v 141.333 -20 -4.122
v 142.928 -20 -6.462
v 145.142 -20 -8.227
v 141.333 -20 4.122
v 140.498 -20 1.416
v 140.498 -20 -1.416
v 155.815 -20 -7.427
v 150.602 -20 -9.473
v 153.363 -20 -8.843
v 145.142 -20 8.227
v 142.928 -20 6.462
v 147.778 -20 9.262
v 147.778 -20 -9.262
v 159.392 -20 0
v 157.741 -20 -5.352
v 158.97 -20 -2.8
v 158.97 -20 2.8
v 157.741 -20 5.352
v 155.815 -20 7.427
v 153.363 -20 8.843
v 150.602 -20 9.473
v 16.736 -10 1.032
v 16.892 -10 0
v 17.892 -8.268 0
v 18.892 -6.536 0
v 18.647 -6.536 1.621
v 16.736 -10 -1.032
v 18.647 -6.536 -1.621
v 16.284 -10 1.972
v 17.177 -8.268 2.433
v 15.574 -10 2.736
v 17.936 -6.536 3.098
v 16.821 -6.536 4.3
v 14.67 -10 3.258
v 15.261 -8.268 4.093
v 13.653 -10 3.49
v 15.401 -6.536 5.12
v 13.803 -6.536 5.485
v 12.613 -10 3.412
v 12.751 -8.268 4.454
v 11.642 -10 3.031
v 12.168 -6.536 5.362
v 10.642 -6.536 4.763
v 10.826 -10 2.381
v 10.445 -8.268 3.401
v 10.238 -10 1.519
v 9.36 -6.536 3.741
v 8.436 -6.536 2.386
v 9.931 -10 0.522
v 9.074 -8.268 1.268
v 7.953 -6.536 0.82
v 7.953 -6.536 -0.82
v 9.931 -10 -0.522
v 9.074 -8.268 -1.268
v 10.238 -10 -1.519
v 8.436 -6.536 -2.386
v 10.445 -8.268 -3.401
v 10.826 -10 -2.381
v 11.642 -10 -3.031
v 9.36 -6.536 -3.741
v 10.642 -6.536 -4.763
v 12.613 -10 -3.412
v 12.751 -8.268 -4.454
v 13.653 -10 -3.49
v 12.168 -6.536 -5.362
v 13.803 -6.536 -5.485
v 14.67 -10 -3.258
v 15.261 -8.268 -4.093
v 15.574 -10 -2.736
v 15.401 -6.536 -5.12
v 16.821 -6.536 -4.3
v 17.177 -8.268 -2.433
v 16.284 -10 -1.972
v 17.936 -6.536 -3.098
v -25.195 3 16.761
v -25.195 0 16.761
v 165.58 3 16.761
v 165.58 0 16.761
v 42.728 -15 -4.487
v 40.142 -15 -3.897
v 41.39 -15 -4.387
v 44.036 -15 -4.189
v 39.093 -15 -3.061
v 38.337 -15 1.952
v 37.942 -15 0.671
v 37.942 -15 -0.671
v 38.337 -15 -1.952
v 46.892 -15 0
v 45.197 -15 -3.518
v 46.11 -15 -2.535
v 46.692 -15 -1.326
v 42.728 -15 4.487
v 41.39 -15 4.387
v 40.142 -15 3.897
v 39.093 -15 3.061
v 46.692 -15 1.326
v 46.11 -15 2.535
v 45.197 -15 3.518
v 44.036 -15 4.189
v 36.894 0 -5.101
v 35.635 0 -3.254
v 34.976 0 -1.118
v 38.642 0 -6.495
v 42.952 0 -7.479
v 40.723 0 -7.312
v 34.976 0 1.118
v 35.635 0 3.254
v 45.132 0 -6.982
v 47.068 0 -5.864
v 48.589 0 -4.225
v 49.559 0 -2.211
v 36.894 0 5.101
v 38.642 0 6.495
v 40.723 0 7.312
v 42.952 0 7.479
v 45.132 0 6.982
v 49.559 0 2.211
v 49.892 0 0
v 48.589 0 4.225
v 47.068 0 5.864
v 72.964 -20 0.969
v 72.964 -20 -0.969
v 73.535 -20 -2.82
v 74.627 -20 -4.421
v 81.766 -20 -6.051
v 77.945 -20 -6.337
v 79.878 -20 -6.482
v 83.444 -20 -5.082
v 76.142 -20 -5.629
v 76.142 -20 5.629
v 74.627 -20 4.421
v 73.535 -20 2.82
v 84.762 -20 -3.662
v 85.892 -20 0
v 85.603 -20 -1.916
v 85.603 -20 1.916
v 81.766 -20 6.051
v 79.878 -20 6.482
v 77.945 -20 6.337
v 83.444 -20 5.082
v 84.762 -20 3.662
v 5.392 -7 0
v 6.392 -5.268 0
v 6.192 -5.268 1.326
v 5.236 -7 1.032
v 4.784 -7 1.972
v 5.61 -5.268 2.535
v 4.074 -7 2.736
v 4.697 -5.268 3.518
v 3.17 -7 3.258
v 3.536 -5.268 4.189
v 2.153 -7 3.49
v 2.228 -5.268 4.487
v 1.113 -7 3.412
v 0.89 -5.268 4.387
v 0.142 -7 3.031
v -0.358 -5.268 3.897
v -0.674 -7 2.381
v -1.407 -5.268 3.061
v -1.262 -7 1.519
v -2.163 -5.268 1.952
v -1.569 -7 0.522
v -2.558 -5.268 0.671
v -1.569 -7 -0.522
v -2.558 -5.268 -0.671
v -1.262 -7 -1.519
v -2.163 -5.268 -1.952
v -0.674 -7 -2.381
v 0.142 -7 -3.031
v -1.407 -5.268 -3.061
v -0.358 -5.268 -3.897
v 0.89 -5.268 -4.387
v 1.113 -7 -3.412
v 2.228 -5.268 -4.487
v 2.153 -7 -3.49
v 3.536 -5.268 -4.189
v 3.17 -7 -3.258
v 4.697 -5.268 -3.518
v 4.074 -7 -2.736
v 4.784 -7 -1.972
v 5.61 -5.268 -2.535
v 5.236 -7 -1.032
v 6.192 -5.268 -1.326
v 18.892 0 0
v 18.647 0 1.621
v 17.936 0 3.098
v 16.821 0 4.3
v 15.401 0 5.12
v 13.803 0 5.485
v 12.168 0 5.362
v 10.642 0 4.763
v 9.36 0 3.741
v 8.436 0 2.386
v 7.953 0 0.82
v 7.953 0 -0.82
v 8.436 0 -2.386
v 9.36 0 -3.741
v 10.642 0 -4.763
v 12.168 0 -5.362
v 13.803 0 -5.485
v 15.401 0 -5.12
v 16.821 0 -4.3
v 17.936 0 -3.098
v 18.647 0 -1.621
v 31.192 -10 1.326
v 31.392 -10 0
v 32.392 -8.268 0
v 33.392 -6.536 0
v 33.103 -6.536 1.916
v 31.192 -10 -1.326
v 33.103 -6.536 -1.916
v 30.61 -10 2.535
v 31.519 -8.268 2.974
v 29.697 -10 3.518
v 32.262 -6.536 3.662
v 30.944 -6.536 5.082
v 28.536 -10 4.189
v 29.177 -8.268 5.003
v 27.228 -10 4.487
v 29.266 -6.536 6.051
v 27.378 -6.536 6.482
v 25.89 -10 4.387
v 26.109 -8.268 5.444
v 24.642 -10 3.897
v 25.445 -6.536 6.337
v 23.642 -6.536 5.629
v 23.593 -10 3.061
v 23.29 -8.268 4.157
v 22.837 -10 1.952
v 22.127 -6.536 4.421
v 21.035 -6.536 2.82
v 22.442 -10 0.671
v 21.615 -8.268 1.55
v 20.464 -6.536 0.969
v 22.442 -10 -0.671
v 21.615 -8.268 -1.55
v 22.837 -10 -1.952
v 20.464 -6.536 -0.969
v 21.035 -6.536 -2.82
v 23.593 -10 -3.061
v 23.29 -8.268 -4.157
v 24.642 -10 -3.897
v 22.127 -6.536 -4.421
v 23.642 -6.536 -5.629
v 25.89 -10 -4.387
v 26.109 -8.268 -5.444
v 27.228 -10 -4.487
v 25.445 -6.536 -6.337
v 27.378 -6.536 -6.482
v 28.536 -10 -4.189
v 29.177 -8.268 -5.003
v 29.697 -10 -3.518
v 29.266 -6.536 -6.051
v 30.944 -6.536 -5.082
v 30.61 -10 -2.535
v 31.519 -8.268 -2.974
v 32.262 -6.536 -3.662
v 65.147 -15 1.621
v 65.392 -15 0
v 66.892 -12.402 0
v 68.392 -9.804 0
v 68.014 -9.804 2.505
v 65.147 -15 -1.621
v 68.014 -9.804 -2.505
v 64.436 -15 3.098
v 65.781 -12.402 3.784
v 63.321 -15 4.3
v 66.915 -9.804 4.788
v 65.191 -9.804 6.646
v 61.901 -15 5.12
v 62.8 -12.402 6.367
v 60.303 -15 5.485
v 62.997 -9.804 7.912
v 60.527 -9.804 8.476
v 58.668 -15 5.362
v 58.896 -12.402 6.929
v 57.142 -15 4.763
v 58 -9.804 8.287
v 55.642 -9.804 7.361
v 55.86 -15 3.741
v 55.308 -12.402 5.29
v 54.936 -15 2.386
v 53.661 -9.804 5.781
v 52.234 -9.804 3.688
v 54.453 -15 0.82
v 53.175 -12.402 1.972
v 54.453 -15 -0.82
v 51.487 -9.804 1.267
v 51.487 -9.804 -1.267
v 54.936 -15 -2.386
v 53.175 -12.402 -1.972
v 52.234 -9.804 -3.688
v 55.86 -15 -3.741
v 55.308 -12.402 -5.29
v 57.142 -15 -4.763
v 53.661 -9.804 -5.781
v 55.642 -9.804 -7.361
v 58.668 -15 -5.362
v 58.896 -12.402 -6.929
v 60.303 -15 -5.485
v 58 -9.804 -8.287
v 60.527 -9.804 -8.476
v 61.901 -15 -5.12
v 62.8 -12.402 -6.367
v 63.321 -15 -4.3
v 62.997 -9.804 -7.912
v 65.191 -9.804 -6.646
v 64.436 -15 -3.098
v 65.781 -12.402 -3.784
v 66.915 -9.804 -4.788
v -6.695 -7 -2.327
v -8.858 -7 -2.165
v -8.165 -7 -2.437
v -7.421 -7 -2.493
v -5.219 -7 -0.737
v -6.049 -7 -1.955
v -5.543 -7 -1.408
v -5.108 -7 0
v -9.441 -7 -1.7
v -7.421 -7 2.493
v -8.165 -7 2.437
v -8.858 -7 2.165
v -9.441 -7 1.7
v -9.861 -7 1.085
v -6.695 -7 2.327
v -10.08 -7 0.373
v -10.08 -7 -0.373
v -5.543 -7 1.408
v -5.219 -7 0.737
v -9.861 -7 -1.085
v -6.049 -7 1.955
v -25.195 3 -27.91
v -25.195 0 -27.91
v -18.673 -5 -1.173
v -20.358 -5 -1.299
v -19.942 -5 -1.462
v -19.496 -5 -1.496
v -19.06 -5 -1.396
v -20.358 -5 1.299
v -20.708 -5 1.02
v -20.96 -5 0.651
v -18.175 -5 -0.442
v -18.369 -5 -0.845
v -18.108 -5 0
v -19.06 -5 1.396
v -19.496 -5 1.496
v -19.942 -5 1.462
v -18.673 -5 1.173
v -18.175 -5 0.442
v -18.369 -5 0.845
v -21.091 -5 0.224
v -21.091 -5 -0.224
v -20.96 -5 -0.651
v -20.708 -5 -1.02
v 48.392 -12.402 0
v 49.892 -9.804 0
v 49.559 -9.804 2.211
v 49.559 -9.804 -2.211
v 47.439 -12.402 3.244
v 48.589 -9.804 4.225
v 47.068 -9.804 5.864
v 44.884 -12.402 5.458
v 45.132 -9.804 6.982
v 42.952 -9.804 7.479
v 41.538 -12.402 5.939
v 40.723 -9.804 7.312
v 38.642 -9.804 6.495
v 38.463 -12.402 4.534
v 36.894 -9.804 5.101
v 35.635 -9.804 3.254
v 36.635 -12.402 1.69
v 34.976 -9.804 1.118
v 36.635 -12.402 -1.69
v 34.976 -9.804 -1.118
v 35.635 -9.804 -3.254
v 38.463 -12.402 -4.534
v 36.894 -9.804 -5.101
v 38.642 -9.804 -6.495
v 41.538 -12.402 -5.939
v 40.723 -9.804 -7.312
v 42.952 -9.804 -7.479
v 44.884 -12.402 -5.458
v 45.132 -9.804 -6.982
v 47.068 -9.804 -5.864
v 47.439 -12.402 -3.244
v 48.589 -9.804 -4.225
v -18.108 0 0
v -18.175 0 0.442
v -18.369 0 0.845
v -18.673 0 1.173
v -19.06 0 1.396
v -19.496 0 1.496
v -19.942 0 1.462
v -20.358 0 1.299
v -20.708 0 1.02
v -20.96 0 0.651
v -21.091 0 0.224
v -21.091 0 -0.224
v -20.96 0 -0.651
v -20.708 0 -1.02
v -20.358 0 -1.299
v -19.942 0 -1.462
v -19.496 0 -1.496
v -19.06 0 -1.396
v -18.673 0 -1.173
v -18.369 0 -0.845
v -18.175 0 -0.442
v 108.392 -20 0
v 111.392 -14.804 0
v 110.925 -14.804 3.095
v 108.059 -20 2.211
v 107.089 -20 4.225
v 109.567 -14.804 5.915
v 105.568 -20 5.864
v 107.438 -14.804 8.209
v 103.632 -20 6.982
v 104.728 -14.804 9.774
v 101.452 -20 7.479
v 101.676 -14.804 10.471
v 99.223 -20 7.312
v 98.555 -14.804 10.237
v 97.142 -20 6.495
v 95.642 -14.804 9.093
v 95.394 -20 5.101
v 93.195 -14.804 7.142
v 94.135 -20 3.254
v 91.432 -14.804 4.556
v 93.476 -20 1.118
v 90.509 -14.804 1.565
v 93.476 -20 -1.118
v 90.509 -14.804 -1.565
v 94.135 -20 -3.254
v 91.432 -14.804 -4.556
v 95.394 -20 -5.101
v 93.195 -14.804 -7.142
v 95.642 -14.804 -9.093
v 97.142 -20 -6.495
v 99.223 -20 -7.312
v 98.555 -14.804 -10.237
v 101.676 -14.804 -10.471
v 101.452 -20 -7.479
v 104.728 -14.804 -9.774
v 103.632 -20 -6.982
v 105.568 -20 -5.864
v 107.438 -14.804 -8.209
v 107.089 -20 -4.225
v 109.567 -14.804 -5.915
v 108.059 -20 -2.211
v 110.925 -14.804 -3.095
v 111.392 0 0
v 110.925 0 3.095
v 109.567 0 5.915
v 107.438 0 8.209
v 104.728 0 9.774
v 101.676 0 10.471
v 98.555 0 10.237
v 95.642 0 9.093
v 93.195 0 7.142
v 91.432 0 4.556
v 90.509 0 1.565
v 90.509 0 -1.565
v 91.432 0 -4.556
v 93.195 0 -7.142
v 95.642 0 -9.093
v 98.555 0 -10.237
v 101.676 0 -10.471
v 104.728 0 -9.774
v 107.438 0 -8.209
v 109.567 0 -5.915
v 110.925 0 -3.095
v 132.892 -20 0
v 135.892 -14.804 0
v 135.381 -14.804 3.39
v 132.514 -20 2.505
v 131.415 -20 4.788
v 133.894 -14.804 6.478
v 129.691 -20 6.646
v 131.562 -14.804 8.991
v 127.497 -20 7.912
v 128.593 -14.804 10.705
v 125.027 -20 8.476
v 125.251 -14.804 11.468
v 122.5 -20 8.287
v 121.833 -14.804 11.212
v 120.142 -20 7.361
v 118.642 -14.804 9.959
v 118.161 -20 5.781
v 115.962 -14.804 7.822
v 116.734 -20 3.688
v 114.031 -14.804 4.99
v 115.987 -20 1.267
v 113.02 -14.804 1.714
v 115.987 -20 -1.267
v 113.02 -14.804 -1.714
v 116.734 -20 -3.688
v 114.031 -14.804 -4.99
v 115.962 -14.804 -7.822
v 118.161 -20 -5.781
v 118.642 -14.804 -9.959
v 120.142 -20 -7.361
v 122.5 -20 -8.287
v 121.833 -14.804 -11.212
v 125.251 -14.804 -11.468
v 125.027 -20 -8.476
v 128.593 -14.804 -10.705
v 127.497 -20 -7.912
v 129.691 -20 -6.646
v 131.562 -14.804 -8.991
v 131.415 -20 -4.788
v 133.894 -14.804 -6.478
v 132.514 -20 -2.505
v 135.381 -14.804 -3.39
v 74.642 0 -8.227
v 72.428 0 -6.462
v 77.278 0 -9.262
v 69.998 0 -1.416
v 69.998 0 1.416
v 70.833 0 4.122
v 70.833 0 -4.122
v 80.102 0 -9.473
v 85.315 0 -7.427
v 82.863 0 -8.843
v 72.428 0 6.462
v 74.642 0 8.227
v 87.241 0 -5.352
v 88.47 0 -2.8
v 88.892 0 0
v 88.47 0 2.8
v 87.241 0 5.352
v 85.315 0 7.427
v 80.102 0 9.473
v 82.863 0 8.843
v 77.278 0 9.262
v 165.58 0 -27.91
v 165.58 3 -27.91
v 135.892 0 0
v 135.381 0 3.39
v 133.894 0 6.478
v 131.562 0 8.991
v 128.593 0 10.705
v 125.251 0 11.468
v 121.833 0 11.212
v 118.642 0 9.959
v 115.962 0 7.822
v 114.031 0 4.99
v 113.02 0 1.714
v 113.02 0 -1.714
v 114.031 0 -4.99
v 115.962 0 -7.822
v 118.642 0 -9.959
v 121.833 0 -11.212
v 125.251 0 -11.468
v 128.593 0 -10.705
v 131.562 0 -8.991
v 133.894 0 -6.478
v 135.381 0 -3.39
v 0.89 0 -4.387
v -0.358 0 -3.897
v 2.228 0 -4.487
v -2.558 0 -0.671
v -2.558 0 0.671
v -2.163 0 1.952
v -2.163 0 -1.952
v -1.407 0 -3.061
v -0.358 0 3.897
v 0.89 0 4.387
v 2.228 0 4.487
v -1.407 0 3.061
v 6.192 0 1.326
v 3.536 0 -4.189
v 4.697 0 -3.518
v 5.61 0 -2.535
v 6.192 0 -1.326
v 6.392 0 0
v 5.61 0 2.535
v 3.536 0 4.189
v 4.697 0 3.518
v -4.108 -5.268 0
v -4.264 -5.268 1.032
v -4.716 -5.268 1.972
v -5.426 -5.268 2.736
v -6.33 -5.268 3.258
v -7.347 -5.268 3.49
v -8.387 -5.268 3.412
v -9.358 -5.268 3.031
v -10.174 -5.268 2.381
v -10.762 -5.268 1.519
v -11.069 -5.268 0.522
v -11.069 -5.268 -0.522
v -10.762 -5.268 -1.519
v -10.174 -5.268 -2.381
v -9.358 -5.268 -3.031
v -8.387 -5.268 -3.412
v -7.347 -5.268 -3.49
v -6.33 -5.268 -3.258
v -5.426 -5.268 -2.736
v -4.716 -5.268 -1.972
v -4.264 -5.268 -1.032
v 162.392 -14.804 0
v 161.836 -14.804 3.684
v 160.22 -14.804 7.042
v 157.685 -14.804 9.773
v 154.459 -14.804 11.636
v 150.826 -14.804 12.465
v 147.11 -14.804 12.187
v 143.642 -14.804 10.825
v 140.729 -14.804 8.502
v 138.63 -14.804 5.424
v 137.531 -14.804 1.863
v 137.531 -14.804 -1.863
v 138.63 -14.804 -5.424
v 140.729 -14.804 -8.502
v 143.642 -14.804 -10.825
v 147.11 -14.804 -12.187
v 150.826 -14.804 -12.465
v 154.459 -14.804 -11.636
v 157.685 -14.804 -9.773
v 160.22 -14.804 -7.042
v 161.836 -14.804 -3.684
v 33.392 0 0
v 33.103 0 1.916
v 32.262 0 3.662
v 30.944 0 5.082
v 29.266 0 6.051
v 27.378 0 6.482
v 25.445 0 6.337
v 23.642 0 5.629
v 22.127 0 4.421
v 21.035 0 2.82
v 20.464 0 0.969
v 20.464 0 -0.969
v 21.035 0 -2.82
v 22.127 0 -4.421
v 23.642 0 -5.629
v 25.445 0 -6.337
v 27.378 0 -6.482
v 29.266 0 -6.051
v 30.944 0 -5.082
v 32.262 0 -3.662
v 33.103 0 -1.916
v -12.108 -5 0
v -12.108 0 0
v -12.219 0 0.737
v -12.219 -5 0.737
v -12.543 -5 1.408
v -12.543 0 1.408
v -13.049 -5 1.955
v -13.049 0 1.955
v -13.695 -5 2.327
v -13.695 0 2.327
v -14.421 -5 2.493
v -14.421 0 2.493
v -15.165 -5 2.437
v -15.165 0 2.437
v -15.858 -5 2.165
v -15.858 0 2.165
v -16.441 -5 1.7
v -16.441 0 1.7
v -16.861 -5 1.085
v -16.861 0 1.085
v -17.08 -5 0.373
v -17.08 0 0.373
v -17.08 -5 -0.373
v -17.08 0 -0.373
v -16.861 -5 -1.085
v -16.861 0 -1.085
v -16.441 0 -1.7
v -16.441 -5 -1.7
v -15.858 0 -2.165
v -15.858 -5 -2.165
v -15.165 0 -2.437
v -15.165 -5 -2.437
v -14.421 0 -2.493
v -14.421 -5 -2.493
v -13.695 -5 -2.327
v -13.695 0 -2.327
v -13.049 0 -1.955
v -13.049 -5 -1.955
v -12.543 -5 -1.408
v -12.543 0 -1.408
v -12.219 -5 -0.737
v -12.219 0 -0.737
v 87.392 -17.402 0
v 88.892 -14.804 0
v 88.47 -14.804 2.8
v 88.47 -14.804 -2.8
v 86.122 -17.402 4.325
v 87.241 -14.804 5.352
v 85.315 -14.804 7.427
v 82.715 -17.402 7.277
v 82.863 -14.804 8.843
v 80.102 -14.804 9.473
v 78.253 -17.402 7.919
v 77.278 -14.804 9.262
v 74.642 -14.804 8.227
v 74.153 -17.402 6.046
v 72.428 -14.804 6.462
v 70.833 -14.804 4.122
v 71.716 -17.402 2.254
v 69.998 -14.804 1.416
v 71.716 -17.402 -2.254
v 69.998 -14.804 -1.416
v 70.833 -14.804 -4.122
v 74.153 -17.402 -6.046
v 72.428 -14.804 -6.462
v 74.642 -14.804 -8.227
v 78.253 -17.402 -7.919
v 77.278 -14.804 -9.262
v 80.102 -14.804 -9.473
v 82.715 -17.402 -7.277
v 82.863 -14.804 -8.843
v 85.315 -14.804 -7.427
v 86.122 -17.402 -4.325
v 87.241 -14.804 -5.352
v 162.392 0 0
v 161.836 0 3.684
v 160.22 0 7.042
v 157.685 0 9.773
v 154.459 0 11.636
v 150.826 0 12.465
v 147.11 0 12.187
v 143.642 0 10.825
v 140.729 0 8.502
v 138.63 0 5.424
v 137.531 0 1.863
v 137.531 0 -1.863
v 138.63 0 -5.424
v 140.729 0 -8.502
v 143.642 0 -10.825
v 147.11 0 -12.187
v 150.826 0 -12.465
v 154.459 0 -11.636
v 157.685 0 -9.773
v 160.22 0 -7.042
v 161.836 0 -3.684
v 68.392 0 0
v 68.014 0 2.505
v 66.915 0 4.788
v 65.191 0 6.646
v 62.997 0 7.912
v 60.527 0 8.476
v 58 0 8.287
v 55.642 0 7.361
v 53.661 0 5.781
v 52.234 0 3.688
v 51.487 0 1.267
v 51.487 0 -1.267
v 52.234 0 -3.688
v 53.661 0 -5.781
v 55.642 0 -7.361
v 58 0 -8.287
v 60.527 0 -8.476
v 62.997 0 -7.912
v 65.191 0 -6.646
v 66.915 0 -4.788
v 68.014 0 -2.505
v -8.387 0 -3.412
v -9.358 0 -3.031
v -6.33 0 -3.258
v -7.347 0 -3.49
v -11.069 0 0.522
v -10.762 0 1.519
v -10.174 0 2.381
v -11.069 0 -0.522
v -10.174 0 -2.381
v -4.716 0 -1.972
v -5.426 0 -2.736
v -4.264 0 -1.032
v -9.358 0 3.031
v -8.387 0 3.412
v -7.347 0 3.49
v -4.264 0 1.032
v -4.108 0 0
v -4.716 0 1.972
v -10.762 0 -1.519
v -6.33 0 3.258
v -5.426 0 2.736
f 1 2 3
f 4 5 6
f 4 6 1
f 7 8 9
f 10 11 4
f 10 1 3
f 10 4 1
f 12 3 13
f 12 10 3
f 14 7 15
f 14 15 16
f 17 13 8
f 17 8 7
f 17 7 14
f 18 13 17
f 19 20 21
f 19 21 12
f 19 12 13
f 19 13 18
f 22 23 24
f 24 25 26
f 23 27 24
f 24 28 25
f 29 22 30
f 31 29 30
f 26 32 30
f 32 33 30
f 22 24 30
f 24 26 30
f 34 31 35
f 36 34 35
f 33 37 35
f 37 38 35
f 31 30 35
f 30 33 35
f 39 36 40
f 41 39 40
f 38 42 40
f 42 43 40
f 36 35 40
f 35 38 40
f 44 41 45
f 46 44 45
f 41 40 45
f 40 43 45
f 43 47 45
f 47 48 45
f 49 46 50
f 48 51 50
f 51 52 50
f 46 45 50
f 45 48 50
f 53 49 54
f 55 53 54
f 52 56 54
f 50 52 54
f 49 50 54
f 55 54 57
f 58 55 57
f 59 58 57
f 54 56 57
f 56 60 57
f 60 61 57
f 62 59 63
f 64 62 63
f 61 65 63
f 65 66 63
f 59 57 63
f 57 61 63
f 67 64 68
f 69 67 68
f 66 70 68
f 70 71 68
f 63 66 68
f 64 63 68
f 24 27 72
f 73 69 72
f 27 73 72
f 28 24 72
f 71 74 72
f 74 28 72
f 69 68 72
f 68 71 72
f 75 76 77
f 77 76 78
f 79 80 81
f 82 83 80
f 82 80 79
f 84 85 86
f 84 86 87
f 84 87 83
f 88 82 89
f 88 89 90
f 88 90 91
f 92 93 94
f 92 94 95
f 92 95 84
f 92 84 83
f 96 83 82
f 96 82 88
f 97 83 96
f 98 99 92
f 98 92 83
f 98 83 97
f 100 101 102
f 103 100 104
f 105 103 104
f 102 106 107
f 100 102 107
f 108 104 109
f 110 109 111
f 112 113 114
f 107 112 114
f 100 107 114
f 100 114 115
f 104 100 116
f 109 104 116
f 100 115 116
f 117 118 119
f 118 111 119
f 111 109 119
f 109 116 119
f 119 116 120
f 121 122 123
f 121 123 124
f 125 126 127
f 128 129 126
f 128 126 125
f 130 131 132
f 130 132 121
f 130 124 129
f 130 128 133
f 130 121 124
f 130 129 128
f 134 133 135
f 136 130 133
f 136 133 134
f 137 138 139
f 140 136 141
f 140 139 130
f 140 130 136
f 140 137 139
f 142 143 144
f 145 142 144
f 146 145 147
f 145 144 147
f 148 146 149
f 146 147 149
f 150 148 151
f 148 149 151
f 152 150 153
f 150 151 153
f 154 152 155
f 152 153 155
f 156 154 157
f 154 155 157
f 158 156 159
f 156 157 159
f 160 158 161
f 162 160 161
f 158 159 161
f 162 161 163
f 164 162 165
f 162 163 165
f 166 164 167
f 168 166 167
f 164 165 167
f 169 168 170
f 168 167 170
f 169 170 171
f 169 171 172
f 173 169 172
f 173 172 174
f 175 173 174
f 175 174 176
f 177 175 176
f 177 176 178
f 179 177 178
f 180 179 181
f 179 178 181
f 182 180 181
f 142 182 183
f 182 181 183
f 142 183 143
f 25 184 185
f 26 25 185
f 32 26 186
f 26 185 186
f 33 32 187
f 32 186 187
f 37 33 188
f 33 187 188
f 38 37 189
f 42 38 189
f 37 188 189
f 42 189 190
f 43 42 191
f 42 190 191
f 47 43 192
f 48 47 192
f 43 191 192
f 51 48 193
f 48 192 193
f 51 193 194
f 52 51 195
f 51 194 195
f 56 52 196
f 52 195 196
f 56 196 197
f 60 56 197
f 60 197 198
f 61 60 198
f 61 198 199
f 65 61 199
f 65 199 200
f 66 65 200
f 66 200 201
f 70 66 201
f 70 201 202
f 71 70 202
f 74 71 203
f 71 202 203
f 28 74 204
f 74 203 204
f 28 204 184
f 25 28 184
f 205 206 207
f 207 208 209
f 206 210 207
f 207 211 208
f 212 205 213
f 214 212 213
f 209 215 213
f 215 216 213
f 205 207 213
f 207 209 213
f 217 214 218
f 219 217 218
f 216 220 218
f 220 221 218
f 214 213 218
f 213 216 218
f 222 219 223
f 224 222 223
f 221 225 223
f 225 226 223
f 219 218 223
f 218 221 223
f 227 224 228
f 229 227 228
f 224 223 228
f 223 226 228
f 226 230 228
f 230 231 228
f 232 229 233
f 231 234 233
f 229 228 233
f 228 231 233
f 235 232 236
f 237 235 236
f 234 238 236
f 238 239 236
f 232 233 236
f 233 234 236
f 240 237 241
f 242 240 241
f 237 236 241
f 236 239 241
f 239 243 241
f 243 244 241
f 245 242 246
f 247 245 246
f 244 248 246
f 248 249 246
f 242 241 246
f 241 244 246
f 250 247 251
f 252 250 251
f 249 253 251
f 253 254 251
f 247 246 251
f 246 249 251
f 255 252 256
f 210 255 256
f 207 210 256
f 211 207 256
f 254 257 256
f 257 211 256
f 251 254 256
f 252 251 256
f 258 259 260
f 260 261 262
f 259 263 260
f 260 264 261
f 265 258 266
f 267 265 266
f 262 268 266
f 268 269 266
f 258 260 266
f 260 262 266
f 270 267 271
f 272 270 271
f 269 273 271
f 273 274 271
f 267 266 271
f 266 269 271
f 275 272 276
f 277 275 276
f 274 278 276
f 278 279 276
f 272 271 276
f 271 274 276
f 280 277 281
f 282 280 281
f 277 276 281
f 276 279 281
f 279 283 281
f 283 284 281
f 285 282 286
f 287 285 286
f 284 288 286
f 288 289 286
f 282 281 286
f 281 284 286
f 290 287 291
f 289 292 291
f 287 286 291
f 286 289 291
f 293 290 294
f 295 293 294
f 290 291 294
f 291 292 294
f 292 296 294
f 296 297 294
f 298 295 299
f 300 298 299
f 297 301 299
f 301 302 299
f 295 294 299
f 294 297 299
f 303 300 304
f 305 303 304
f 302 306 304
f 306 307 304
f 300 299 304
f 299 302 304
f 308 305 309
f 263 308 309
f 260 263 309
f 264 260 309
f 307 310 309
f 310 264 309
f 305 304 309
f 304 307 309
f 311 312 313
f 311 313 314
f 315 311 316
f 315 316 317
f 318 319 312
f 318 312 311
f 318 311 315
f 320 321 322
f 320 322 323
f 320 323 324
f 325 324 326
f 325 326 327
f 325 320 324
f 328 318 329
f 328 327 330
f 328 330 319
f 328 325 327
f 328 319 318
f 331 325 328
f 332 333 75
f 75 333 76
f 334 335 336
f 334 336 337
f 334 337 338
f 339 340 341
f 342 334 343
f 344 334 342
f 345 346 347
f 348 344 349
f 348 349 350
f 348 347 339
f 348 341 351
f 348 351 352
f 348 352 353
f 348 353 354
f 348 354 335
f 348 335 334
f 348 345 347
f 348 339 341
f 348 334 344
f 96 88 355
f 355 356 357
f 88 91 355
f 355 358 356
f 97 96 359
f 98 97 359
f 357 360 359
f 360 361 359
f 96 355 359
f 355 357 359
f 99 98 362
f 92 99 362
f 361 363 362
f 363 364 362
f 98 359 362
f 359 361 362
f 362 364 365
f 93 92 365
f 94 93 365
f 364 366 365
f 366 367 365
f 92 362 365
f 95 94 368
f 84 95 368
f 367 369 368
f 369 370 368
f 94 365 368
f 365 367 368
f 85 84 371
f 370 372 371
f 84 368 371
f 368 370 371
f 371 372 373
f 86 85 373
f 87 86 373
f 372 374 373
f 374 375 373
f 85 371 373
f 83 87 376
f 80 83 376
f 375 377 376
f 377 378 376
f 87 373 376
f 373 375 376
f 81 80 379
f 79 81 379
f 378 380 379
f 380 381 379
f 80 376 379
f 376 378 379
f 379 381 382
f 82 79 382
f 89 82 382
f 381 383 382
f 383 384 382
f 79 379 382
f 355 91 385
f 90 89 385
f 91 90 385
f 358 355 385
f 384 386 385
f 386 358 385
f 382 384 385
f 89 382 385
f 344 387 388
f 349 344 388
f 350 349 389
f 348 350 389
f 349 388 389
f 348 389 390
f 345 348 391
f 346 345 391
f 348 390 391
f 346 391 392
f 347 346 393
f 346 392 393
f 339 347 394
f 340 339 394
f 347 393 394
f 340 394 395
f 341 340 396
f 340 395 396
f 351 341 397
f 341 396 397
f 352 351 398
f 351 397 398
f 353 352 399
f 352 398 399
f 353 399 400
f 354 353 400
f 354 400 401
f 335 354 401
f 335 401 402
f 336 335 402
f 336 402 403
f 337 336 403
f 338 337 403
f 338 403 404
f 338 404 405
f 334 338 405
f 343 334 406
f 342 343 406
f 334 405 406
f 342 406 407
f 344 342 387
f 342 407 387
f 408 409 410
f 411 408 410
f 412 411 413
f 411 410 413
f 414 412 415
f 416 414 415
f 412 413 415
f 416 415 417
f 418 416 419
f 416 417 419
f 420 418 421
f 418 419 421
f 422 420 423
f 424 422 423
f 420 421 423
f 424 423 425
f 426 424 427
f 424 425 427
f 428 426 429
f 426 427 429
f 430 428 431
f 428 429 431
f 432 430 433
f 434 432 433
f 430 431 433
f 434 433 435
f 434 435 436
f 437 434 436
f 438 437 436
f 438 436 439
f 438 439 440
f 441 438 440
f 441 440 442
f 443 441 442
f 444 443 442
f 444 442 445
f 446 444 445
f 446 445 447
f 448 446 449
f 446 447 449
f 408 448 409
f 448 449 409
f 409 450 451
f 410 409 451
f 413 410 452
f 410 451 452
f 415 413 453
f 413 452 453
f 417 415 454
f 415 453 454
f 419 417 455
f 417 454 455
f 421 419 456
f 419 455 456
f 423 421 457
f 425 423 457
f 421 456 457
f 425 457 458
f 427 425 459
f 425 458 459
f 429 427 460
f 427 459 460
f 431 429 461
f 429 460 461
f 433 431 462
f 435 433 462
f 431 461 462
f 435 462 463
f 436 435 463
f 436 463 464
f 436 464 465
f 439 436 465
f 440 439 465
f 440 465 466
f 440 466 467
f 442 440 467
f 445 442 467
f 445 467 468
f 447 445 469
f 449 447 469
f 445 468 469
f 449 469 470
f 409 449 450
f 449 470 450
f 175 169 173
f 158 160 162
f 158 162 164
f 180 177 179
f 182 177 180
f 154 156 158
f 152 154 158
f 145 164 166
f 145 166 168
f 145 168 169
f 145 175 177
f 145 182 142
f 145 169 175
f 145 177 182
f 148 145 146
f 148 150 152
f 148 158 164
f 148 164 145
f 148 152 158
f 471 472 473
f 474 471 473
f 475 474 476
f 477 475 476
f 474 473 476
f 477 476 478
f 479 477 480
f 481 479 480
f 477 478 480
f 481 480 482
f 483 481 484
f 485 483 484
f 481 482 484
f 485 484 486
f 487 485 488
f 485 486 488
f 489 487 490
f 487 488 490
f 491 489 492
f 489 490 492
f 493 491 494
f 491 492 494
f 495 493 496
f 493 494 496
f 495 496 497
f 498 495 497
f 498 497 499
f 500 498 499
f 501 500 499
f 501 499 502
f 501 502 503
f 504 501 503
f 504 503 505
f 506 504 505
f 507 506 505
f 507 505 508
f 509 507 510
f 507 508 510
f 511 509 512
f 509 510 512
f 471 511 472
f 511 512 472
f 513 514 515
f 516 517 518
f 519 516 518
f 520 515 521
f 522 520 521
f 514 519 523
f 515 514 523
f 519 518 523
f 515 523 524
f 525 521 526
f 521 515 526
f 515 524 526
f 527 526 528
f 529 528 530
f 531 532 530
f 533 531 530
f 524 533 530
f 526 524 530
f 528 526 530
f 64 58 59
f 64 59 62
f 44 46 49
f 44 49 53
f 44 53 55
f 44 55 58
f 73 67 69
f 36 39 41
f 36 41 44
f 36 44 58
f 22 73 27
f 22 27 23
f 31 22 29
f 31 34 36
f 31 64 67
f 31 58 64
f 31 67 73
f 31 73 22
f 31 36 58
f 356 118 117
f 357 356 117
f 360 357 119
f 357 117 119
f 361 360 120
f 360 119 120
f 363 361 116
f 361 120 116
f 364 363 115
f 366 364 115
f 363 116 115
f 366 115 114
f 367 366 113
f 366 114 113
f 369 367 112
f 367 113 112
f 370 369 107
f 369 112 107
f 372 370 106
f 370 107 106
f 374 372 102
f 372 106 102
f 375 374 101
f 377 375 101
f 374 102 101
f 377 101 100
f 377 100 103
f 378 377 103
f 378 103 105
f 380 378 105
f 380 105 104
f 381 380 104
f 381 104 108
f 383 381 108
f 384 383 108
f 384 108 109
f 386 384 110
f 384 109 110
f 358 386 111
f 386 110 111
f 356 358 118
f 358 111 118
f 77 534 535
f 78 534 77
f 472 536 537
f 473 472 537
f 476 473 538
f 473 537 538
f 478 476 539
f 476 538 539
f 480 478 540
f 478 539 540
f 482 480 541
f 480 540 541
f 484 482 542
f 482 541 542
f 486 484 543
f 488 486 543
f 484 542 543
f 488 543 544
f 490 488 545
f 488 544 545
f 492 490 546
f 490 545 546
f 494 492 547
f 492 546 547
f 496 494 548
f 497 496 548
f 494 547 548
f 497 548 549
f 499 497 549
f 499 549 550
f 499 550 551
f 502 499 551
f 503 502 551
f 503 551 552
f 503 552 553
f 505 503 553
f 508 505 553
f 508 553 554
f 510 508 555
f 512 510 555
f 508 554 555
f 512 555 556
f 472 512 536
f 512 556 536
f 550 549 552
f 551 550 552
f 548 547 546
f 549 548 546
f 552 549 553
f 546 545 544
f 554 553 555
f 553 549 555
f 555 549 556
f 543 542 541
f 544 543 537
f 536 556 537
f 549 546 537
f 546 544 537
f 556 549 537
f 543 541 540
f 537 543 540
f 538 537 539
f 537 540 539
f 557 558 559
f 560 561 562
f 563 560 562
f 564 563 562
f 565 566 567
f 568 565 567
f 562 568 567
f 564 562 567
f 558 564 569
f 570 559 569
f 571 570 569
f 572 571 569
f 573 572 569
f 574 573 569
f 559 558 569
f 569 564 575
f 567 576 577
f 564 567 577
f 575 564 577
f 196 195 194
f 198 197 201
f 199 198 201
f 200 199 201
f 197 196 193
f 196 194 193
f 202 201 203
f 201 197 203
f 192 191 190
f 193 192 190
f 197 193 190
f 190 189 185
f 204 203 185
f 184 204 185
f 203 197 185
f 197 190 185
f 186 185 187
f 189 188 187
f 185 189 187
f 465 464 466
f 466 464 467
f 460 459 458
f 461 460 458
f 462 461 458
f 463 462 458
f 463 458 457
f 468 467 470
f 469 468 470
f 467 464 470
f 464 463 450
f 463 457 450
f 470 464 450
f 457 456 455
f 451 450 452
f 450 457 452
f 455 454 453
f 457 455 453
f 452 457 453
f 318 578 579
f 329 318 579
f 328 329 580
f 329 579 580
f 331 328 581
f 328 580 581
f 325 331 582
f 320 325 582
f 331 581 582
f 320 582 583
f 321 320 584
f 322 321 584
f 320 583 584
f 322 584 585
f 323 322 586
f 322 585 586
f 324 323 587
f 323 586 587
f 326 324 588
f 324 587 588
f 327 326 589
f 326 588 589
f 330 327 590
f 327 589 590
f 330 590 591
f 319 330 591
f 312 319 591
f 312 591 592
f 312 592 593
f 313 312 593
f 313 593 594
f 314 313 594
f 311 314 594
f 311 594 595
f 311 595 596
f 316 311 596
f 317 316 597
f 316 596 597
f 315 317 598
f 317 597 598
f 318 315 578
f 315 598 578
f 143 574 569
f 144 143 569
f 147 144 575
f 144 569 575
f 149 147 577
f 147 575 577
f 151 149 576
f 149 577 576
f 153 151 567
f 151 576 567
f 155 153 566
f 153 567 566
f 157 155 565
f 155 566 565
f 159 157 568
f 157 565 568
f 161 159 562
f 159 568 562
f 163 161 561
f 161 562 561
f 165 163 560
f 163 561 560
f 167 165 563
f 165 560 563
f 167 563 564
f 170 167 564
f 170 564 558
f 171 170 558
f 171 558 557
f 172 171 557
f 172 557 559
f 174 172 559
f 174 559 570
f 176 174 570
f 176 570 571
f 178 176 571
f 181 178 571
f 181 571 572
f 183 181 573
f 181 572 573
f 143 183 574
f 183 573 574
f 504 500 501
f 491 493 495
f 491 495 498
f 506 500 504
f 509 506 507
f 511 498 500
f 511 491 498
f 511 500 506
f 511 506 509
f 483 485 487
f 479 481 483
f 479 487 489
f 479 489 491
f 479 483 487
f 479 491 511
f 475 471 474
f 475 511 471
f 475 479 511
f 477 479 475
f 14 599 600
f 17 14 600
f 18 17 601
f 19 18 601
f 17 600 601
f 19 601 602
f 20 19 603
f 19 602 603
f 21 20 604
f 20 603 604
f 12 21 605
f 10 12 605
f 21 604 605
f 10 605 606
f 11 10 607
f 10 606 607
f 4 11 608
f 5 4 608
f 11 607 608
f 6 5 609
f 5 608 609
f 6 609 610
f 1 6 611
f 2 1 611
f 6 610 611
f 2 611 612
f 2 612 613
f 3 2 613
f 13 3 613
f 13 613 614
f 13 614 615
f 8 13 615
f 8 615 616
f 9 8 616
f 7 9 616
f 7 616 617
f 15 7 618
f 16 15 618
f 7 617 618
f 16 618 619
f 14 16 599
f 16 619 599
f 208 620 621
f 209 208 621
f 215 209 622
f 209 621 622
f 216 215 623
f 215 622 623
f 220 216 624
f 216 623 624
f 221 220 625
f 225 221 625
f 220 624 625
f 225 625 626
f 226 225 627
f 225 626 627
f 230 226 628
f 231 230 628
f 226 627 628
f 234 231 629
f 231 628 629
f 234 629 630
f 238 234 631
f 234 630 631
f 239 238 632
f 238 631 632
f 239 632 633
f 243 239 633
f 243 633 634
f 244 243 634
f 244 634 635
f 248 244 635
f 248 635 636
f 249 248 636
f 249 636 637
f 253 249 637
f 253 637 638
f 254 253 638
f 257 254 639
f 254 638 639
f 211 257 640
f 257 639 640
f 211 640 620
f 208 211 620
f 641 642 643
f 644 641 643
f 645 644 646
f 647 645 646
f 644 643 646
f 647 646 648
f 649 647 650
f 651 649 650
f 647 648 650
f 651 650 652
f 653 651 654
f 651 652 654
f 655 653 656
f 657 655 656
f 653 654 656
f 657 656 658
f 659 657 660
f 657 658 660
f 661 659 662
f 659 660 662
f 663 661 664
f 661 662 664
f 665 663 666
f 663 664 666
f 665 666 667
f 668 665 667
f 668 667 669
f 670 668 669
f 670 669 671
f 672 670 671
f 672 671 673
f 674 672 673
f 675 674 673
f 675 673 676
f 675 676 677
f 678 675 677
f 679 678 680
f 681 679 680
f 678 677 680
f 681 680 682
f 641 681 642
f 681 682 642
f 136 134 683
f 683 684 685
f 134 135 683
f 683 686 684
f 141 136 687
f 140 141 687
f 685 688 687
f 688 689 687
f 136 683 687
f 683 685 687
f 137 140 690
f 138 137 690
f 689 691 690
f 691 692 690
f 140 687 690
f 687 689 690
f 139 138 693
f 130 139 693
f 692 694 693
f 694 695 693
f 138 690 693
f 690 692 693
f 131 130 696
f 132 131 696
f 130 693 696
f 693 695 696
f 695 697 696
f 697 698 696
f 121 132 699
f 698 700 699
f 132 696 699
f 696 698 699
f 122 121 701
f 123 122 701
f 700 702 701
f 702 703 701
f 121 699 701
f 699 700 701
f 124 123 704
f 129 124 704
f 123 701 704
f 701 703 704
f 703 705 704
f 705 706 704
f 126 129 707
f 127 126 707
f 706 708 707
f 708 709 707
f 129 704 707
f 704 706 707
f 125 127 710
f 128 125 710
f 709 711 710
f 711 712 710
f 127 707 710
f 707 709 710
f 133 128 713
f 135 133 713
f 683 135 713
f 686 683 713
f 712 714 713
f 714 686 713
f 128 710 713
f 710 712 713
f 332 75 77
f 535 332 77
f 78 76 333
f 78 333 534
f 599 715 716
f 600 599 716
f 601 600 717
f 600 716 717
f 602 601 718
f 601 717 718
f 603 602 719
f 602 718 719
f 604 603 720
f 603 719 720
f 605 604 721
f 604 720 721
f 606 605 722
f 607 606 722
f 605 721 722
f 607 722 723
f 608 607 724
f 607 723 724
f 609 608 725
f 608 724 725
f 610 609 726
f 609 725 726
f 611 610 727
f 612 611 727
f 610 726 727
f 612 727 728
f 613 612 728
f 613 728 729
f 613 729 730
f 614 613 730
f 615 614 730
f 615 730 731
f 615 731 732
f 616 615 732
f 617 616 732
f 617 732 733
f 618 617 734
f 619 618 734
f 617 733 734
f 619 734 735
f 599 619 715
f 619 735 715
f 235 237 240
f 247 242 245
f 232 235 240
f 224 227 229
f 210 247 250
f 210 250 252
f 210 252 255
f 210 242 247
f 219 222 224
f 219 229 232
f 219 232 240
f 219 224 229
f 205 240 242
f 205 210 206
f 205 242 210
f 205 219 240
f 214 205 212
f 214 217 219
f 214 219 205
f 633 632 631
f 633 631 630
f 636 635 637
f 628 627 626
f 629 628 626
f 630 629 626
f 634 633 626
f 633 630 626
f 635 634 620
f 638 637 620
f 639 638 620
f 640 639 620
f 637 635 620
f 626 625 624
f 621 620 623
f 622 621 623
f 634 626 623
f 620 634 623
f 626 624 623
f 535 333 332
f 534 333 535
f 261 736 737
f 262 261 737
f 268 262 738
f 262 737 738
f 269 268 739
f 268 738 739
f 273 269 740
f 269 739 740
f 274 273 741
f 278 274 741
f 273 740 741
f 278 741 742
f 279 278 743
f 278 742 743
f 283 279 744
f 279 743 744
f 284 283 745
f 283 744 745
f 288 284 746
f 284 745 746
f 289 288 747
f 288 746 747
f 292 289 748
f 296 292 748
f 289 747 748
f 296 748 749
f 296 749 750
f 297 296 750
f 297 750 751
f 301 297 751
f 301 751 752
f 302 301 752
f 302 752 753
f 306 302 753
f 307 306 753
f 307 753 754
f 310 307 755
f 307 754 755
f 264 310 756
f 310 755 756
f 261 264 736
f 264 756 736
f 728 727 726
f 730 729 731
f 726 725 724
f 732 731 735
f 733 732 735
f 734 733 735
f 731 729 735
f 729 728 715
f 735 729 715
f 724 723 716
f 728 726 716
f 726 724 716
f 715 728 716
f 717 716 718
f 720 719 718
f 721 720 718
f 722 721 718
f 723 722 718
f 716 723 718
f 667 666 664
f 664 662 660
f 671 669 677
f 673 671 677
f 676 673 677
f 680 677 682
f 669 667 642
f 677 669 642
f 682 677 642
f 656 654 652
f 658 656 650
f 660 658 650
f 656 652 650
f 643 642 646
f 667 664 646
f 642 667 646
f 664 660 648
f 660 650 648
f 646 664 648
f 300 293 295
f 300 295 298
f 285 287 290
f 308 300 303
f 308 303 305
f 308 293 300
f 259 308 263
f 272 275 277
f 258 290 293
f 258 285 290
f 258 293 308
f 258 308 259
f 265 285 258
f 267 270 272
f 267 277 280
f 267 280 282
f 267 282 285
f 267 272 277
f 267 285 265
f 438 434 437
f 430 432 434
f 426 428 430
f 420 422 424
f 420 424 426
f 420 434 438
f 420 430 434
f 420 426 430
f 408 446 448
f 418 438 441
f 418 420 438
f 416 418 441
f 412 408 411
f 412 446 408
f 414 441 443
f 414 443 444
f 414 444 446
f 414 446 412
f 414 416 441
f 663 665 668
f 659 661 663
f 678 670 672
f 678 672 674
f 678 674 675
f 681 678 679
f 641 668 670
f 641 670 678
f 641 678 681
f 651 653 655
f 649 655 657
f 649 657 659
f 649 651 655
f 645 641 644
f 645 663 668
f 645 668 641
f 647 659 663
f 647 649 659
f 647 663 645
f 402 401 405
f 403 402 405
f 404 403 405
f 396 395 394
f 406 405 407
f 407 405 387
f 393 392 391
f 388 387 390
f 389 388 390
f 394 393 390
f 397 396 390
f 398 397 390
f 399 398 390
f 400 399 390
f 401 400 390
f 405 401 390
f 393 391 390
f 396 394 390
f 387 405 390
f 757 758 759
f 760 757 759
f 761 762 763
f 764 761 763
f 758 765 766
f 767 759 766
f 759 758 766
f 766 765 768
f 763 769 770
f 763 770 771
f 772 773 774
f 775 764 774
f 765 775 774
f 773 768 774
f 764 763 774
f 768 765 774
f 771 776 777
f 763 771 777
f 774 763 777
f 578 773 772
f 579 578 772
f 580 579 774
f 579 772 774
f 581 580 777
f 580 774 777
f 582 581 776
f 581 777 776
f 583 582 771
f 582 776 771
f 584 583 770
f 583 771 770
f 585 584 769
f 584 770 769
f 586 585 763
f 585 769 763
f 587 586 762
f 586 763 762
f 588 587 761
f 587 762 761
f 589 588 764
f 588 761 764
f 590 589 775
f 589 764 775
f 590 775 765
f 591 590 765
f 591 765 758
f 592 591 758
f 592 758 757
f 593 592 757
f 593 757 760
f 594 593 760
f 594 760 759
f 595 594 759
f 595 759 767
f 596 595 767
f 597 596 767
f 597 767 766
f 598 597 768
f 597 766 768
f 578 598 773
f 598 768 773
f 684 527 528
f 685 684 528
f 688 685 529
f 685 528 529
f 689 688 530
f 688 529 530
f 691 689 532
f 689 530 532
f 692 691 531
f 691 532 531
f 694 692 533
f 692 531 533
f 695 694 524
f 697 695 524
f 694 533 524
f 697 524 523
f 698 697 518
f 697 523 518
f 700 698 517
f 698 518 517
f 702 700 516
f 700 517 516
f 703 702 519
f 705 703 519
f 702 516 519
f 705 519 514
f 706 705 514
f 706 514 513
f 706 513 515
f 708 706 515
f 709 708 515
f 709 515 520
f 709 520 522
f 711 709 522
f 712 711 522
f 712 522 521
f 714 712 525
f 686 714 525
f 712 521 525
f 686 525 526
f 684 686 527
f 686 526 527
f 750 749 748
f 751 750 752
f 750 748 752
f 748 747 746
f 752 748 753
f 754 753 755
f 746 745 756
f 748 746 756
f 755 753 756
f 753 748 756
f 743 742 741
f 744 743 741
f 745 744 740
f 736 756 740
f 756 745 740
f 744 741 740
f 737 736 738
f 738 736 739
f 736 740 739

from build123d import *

# Parameters (mm, degrees)
F0_R        = 1.5
F1_DEPTH    = 5
F0_R_2      = 2.5
F0_R_3      = 3.5
F2_DEPTH    = 7
F0_R_4      = 4.5
F0_R_5      = 5.5
F3_DEPTH    = 10
F0_R_6      = 6.5
F0_R_7      = 7.5
F4_DEPTH    = 15
F0_R_8      = 8.5
F0_R_9      = 9.5
F5_DEPTH    = 20
F0_R_10     = 10.5
F0_R_11     = 11.5
F6_DEPTH    = 20
F0_R_12     = 12.5
F7_W        = 190.7746661454
F7_H        = 44.6706470102
F8_DEPTH    = 3
F9_SIZE2    = 5.1961524227
F9_SIZE     = 3
F9_2_SIZE2  = 5.1961524227
F9_2_SIZE   = 3
F9_3_SIZE2  = 5.1961524227
F9_3_SIZE   = 3
F9_4_SIZE2  = 5.1961524227
F9_4_SIZE   = 3
F9_5_SIZE2  = 5.1961524227
F9_5_SIZE   = 3
F9_6_SIZE2  = 5.1961524227
F9_6_SIZE   = 3
F10_SIZE2   = 3.4641016151
F10_SIZE    = 2
F10_2_SIZE2 = 3.4641016151
F10_2_SIZE  = 2
F11_SIZE2   = 1.7320508076
F11_SIZE    = 1
F11_2_SIZE2 = 1.7320508076
F11_2_SIZE  = 1


with BuildPart() as f1:
    # F0 (on Front) → F1 (new body)
    with BuildSketch(Plane.XZ):
        with Locations((-19.6082217147, 0)):
            Circle(F0_R)
    extrude(amount=F1_DEPTH)


with BuildPart() as f1b:
    # F0 (on Front) → F1, piece 2 (new body)
    with BuildSketch(Plane.XZ):
        with Locations((-14.6082217147, 0)):
            Circle(F0_R_2)
    extrude(amount=F1_DEPTH)


with BuildPart() as f2:
    # F0 (on Front) → F2 (new body)
    with BuildSketch(Plane.XZ):
        with Locations((-7.6082217147, 0)):
            Circle(F0_R_3)
    extrude(amount=F2_DEPTH)

    # F11#2
    f11_2_edges = [f2.edges().sort_by_distance(p)[0] for p in [
        (-11.108222, -7, 0),
    ]]
    f11_2_side = f2.faces().sort_by_distance((-7.608222, -7, 0))[0]
    chamfer(f11_2_edges, length=F11_2_SIZE, length2=F11_2_SIZE2, reference=f11_2_side)


with BuildPart() as f2b:
    # F0 (on Front) → F2, piece 2 (new body)
    with BuildSketch(Plane.XZ):
        with Locations((1.8917782853, 0)):
            Circle(F0_R_4)
    extrude(amount=F2_DEPTH)

    # F11
    f11_edges = [f2b.edges().sort_by_distance(p)[0] for p in [
        (-2.608222, -7, 0),
    ]]
    f11_side = f2b.faces().sort_by_distance((1.891778, -7, 0))[0]
    chamfer(f11_edges, length=F11_SIZE, length2=F11_SIZE2, reference=f11_side)


with BuildPart() as f3:
    # F0 (on Front) → F3 (new body)
    with BuildSketch(Plane.XZ):
        with Locations((13.3917782853, 0)):
            Circle(F0_R_5)
    extrude(amount=F3_DEPTH)

    # F10#2
    f10_2_edges = [f3.edges().sort_by_distance(p)[0] for p in [
        (7.891778, -10, 0),
    ]]
    f10_2_side = f3.faces().sort_by_distance((13.391778, -10, 0))[0]
    chamfer(f10_2_edges, length=F10_2_SIZE, length2=F10_2_SIZE2, reference=f10_2_side)


with BuildPart() as f3b:
    # F0 (on Front) → F3, piece 2 (new body)
    with BuildSketch(Plane.XZ):
        with Locations((26.8917782853, 0)):
            Circle(F0_R_6)
    extrude(amount=F3_DEPTH)

    # F10
    f10_edges = [f3b.edges().sort_by_distance(p)[0] for p in [
        (20.391778, -10, 0),
    ]]
    f10_side = f3b.faces().sort_by_distance((26.891778, -10, 0))[0]
    chamfer(f10_edges, length=F10_SIZE, length2=F10_SIZE2, reference=f10_side)


with BuildPart() as f4:
    # F0 (on Front) → F4 (new body)
    with BuildSketch(Plane.XZ):
        with Locations((42.3917782853, 0)):
            Circle(F0_R_7)
    extrude(amount=F4_DEPTH)

    # F9#6
    f9_6_edges = [f4.edges().sort_by_distance(p)[0] for p in [
        (34.891778, -15, 0),
    ]]
    f9_6_side = f4.faces().sort_by_distance((42.391778, -15, 0))[0]
    chamfer(f9_6_edges, length=F9_6_SIZE, length2=F9_6_SIZE2, reference=f9_6_side)


with BuildPart() as f4b:
    # F0 (on Front) → F4, piece 2 (new body)
    with BuildSketch(Plane.XZ):
        with Locations((59.8917782853, 0)):
            Circle(F0_R_8)
    extrude(amount=F4_DEPTH)

    # F9#5
    f9_5_edges = [f4b.edges().sort_by_distance(p)[0] for p in [
        (51.391778, -15, 0),
    ]]
    f9_5_side = f4b.faces().sort_by_distance((59.891778, -15, 0))[0]
    chamfer(f9_5_edges, length=F9_5_SIZE, length2=F9_5_SIZE2, reference=f9_5_side)


with BuildPart() as f5:
    # F0 (on Front) → F5 (new body)
    with BuildSketch(Plane.XZ):
        with Locations((79.3917782853, 0)):
            Circle(F0_R_9)
    extrude(amount=F5_DEPTH)

    # F9#4
    f9_4_edges = [f5.edges().sort_by_distance(p)[0] for p in [
        (69.891778, -20, 0),
    ]]
    f9_4_side = f5.faces().sort_by_distance((79.391778, -20, 0))[0]
    chamfer(f9_4_edges, length=F9_4_SIZE, length2=F9_4_SIZE2, reference=f9_4_side)


with BuildPart() as f5b:
    # F0 (on Front) → F5, piece 2 (new body)
    with BuildSketch(Plane.XZ):
        with Locations((100.8917782853, 0)):
            Circle(F0_R_10)
    extrude(amount=F5_DEPTH)

    # F9#3
    f9_3_edges = [f5b.edges().sort_by_distance(p)[0] for p in [
        (90.391778, -20, 0),
    ]]
    f9_3_side = f5b.faces().sort_by_distance((100.891778, -20, 0))[0]
    chamfer(f9_3_edges, length=F9_3_SIZE, length2=F9_3_SIZE2, reference=f9_3_side)


with BuildPart() as f6:
    # F0 (on Front) → F6 (new body)
    with BuildSketch(Plane.XZ):
        with Locations((124.3917782853, 0)):
            Circle(F0_R_11)
    extrude(amount=F6_DEPTH)

    # F9#2
    f9_2_edges = [f6.edges().sort_by_distance(p)[0] for p in [
        (112.891778, -20, 0),
    ]]
    f9_2_side = f6.faces().sort_by_distance((124.391778, -20, 0))[0]
    chamfer(f9_2_edges, length=F9_2_SIZE, length2=F9_2_SIZE2, reference=f9_2_side)


with BuildPart() as f6b:
    # F0 (on Front) → F6, piece 2 (new body)
    with BuildSketch(Plane.XZ):
        with Locations((149.8917782853, 0)):
            Circle(F0_R_12)
    extrude(amount=F6_DEPTH)

    # F9
    f9_edges = [f6b.edges().sort_by_distance(p)[0] for p in [
        (137.391778, -20, 0),
    ]]
    f9_side = f6b.faces().sort_by_distance((149.891778, -20, 0))[0]
    chamfer(f9_edges, length=F9_SIZE, length2=F9_SIZE2, reference=f9_side)


with BuildPart() as f8:
    # F7 (on Front) → F8 (new body)
    with BuildSketch(Plane.XZ):
        with Locations((70.1923733577, -5.5747600272)):
            Rectangle(F7_W, F7_H)
    extrude(amount=-F8_DEPTH)


solid = Compound([f1.part, f1b.part, f2.part, f2b.part, f3.part, f3b.part, f4.part, f4b.part, f5.part, f5b.part, f6.part, f6b.part, f8.part])
